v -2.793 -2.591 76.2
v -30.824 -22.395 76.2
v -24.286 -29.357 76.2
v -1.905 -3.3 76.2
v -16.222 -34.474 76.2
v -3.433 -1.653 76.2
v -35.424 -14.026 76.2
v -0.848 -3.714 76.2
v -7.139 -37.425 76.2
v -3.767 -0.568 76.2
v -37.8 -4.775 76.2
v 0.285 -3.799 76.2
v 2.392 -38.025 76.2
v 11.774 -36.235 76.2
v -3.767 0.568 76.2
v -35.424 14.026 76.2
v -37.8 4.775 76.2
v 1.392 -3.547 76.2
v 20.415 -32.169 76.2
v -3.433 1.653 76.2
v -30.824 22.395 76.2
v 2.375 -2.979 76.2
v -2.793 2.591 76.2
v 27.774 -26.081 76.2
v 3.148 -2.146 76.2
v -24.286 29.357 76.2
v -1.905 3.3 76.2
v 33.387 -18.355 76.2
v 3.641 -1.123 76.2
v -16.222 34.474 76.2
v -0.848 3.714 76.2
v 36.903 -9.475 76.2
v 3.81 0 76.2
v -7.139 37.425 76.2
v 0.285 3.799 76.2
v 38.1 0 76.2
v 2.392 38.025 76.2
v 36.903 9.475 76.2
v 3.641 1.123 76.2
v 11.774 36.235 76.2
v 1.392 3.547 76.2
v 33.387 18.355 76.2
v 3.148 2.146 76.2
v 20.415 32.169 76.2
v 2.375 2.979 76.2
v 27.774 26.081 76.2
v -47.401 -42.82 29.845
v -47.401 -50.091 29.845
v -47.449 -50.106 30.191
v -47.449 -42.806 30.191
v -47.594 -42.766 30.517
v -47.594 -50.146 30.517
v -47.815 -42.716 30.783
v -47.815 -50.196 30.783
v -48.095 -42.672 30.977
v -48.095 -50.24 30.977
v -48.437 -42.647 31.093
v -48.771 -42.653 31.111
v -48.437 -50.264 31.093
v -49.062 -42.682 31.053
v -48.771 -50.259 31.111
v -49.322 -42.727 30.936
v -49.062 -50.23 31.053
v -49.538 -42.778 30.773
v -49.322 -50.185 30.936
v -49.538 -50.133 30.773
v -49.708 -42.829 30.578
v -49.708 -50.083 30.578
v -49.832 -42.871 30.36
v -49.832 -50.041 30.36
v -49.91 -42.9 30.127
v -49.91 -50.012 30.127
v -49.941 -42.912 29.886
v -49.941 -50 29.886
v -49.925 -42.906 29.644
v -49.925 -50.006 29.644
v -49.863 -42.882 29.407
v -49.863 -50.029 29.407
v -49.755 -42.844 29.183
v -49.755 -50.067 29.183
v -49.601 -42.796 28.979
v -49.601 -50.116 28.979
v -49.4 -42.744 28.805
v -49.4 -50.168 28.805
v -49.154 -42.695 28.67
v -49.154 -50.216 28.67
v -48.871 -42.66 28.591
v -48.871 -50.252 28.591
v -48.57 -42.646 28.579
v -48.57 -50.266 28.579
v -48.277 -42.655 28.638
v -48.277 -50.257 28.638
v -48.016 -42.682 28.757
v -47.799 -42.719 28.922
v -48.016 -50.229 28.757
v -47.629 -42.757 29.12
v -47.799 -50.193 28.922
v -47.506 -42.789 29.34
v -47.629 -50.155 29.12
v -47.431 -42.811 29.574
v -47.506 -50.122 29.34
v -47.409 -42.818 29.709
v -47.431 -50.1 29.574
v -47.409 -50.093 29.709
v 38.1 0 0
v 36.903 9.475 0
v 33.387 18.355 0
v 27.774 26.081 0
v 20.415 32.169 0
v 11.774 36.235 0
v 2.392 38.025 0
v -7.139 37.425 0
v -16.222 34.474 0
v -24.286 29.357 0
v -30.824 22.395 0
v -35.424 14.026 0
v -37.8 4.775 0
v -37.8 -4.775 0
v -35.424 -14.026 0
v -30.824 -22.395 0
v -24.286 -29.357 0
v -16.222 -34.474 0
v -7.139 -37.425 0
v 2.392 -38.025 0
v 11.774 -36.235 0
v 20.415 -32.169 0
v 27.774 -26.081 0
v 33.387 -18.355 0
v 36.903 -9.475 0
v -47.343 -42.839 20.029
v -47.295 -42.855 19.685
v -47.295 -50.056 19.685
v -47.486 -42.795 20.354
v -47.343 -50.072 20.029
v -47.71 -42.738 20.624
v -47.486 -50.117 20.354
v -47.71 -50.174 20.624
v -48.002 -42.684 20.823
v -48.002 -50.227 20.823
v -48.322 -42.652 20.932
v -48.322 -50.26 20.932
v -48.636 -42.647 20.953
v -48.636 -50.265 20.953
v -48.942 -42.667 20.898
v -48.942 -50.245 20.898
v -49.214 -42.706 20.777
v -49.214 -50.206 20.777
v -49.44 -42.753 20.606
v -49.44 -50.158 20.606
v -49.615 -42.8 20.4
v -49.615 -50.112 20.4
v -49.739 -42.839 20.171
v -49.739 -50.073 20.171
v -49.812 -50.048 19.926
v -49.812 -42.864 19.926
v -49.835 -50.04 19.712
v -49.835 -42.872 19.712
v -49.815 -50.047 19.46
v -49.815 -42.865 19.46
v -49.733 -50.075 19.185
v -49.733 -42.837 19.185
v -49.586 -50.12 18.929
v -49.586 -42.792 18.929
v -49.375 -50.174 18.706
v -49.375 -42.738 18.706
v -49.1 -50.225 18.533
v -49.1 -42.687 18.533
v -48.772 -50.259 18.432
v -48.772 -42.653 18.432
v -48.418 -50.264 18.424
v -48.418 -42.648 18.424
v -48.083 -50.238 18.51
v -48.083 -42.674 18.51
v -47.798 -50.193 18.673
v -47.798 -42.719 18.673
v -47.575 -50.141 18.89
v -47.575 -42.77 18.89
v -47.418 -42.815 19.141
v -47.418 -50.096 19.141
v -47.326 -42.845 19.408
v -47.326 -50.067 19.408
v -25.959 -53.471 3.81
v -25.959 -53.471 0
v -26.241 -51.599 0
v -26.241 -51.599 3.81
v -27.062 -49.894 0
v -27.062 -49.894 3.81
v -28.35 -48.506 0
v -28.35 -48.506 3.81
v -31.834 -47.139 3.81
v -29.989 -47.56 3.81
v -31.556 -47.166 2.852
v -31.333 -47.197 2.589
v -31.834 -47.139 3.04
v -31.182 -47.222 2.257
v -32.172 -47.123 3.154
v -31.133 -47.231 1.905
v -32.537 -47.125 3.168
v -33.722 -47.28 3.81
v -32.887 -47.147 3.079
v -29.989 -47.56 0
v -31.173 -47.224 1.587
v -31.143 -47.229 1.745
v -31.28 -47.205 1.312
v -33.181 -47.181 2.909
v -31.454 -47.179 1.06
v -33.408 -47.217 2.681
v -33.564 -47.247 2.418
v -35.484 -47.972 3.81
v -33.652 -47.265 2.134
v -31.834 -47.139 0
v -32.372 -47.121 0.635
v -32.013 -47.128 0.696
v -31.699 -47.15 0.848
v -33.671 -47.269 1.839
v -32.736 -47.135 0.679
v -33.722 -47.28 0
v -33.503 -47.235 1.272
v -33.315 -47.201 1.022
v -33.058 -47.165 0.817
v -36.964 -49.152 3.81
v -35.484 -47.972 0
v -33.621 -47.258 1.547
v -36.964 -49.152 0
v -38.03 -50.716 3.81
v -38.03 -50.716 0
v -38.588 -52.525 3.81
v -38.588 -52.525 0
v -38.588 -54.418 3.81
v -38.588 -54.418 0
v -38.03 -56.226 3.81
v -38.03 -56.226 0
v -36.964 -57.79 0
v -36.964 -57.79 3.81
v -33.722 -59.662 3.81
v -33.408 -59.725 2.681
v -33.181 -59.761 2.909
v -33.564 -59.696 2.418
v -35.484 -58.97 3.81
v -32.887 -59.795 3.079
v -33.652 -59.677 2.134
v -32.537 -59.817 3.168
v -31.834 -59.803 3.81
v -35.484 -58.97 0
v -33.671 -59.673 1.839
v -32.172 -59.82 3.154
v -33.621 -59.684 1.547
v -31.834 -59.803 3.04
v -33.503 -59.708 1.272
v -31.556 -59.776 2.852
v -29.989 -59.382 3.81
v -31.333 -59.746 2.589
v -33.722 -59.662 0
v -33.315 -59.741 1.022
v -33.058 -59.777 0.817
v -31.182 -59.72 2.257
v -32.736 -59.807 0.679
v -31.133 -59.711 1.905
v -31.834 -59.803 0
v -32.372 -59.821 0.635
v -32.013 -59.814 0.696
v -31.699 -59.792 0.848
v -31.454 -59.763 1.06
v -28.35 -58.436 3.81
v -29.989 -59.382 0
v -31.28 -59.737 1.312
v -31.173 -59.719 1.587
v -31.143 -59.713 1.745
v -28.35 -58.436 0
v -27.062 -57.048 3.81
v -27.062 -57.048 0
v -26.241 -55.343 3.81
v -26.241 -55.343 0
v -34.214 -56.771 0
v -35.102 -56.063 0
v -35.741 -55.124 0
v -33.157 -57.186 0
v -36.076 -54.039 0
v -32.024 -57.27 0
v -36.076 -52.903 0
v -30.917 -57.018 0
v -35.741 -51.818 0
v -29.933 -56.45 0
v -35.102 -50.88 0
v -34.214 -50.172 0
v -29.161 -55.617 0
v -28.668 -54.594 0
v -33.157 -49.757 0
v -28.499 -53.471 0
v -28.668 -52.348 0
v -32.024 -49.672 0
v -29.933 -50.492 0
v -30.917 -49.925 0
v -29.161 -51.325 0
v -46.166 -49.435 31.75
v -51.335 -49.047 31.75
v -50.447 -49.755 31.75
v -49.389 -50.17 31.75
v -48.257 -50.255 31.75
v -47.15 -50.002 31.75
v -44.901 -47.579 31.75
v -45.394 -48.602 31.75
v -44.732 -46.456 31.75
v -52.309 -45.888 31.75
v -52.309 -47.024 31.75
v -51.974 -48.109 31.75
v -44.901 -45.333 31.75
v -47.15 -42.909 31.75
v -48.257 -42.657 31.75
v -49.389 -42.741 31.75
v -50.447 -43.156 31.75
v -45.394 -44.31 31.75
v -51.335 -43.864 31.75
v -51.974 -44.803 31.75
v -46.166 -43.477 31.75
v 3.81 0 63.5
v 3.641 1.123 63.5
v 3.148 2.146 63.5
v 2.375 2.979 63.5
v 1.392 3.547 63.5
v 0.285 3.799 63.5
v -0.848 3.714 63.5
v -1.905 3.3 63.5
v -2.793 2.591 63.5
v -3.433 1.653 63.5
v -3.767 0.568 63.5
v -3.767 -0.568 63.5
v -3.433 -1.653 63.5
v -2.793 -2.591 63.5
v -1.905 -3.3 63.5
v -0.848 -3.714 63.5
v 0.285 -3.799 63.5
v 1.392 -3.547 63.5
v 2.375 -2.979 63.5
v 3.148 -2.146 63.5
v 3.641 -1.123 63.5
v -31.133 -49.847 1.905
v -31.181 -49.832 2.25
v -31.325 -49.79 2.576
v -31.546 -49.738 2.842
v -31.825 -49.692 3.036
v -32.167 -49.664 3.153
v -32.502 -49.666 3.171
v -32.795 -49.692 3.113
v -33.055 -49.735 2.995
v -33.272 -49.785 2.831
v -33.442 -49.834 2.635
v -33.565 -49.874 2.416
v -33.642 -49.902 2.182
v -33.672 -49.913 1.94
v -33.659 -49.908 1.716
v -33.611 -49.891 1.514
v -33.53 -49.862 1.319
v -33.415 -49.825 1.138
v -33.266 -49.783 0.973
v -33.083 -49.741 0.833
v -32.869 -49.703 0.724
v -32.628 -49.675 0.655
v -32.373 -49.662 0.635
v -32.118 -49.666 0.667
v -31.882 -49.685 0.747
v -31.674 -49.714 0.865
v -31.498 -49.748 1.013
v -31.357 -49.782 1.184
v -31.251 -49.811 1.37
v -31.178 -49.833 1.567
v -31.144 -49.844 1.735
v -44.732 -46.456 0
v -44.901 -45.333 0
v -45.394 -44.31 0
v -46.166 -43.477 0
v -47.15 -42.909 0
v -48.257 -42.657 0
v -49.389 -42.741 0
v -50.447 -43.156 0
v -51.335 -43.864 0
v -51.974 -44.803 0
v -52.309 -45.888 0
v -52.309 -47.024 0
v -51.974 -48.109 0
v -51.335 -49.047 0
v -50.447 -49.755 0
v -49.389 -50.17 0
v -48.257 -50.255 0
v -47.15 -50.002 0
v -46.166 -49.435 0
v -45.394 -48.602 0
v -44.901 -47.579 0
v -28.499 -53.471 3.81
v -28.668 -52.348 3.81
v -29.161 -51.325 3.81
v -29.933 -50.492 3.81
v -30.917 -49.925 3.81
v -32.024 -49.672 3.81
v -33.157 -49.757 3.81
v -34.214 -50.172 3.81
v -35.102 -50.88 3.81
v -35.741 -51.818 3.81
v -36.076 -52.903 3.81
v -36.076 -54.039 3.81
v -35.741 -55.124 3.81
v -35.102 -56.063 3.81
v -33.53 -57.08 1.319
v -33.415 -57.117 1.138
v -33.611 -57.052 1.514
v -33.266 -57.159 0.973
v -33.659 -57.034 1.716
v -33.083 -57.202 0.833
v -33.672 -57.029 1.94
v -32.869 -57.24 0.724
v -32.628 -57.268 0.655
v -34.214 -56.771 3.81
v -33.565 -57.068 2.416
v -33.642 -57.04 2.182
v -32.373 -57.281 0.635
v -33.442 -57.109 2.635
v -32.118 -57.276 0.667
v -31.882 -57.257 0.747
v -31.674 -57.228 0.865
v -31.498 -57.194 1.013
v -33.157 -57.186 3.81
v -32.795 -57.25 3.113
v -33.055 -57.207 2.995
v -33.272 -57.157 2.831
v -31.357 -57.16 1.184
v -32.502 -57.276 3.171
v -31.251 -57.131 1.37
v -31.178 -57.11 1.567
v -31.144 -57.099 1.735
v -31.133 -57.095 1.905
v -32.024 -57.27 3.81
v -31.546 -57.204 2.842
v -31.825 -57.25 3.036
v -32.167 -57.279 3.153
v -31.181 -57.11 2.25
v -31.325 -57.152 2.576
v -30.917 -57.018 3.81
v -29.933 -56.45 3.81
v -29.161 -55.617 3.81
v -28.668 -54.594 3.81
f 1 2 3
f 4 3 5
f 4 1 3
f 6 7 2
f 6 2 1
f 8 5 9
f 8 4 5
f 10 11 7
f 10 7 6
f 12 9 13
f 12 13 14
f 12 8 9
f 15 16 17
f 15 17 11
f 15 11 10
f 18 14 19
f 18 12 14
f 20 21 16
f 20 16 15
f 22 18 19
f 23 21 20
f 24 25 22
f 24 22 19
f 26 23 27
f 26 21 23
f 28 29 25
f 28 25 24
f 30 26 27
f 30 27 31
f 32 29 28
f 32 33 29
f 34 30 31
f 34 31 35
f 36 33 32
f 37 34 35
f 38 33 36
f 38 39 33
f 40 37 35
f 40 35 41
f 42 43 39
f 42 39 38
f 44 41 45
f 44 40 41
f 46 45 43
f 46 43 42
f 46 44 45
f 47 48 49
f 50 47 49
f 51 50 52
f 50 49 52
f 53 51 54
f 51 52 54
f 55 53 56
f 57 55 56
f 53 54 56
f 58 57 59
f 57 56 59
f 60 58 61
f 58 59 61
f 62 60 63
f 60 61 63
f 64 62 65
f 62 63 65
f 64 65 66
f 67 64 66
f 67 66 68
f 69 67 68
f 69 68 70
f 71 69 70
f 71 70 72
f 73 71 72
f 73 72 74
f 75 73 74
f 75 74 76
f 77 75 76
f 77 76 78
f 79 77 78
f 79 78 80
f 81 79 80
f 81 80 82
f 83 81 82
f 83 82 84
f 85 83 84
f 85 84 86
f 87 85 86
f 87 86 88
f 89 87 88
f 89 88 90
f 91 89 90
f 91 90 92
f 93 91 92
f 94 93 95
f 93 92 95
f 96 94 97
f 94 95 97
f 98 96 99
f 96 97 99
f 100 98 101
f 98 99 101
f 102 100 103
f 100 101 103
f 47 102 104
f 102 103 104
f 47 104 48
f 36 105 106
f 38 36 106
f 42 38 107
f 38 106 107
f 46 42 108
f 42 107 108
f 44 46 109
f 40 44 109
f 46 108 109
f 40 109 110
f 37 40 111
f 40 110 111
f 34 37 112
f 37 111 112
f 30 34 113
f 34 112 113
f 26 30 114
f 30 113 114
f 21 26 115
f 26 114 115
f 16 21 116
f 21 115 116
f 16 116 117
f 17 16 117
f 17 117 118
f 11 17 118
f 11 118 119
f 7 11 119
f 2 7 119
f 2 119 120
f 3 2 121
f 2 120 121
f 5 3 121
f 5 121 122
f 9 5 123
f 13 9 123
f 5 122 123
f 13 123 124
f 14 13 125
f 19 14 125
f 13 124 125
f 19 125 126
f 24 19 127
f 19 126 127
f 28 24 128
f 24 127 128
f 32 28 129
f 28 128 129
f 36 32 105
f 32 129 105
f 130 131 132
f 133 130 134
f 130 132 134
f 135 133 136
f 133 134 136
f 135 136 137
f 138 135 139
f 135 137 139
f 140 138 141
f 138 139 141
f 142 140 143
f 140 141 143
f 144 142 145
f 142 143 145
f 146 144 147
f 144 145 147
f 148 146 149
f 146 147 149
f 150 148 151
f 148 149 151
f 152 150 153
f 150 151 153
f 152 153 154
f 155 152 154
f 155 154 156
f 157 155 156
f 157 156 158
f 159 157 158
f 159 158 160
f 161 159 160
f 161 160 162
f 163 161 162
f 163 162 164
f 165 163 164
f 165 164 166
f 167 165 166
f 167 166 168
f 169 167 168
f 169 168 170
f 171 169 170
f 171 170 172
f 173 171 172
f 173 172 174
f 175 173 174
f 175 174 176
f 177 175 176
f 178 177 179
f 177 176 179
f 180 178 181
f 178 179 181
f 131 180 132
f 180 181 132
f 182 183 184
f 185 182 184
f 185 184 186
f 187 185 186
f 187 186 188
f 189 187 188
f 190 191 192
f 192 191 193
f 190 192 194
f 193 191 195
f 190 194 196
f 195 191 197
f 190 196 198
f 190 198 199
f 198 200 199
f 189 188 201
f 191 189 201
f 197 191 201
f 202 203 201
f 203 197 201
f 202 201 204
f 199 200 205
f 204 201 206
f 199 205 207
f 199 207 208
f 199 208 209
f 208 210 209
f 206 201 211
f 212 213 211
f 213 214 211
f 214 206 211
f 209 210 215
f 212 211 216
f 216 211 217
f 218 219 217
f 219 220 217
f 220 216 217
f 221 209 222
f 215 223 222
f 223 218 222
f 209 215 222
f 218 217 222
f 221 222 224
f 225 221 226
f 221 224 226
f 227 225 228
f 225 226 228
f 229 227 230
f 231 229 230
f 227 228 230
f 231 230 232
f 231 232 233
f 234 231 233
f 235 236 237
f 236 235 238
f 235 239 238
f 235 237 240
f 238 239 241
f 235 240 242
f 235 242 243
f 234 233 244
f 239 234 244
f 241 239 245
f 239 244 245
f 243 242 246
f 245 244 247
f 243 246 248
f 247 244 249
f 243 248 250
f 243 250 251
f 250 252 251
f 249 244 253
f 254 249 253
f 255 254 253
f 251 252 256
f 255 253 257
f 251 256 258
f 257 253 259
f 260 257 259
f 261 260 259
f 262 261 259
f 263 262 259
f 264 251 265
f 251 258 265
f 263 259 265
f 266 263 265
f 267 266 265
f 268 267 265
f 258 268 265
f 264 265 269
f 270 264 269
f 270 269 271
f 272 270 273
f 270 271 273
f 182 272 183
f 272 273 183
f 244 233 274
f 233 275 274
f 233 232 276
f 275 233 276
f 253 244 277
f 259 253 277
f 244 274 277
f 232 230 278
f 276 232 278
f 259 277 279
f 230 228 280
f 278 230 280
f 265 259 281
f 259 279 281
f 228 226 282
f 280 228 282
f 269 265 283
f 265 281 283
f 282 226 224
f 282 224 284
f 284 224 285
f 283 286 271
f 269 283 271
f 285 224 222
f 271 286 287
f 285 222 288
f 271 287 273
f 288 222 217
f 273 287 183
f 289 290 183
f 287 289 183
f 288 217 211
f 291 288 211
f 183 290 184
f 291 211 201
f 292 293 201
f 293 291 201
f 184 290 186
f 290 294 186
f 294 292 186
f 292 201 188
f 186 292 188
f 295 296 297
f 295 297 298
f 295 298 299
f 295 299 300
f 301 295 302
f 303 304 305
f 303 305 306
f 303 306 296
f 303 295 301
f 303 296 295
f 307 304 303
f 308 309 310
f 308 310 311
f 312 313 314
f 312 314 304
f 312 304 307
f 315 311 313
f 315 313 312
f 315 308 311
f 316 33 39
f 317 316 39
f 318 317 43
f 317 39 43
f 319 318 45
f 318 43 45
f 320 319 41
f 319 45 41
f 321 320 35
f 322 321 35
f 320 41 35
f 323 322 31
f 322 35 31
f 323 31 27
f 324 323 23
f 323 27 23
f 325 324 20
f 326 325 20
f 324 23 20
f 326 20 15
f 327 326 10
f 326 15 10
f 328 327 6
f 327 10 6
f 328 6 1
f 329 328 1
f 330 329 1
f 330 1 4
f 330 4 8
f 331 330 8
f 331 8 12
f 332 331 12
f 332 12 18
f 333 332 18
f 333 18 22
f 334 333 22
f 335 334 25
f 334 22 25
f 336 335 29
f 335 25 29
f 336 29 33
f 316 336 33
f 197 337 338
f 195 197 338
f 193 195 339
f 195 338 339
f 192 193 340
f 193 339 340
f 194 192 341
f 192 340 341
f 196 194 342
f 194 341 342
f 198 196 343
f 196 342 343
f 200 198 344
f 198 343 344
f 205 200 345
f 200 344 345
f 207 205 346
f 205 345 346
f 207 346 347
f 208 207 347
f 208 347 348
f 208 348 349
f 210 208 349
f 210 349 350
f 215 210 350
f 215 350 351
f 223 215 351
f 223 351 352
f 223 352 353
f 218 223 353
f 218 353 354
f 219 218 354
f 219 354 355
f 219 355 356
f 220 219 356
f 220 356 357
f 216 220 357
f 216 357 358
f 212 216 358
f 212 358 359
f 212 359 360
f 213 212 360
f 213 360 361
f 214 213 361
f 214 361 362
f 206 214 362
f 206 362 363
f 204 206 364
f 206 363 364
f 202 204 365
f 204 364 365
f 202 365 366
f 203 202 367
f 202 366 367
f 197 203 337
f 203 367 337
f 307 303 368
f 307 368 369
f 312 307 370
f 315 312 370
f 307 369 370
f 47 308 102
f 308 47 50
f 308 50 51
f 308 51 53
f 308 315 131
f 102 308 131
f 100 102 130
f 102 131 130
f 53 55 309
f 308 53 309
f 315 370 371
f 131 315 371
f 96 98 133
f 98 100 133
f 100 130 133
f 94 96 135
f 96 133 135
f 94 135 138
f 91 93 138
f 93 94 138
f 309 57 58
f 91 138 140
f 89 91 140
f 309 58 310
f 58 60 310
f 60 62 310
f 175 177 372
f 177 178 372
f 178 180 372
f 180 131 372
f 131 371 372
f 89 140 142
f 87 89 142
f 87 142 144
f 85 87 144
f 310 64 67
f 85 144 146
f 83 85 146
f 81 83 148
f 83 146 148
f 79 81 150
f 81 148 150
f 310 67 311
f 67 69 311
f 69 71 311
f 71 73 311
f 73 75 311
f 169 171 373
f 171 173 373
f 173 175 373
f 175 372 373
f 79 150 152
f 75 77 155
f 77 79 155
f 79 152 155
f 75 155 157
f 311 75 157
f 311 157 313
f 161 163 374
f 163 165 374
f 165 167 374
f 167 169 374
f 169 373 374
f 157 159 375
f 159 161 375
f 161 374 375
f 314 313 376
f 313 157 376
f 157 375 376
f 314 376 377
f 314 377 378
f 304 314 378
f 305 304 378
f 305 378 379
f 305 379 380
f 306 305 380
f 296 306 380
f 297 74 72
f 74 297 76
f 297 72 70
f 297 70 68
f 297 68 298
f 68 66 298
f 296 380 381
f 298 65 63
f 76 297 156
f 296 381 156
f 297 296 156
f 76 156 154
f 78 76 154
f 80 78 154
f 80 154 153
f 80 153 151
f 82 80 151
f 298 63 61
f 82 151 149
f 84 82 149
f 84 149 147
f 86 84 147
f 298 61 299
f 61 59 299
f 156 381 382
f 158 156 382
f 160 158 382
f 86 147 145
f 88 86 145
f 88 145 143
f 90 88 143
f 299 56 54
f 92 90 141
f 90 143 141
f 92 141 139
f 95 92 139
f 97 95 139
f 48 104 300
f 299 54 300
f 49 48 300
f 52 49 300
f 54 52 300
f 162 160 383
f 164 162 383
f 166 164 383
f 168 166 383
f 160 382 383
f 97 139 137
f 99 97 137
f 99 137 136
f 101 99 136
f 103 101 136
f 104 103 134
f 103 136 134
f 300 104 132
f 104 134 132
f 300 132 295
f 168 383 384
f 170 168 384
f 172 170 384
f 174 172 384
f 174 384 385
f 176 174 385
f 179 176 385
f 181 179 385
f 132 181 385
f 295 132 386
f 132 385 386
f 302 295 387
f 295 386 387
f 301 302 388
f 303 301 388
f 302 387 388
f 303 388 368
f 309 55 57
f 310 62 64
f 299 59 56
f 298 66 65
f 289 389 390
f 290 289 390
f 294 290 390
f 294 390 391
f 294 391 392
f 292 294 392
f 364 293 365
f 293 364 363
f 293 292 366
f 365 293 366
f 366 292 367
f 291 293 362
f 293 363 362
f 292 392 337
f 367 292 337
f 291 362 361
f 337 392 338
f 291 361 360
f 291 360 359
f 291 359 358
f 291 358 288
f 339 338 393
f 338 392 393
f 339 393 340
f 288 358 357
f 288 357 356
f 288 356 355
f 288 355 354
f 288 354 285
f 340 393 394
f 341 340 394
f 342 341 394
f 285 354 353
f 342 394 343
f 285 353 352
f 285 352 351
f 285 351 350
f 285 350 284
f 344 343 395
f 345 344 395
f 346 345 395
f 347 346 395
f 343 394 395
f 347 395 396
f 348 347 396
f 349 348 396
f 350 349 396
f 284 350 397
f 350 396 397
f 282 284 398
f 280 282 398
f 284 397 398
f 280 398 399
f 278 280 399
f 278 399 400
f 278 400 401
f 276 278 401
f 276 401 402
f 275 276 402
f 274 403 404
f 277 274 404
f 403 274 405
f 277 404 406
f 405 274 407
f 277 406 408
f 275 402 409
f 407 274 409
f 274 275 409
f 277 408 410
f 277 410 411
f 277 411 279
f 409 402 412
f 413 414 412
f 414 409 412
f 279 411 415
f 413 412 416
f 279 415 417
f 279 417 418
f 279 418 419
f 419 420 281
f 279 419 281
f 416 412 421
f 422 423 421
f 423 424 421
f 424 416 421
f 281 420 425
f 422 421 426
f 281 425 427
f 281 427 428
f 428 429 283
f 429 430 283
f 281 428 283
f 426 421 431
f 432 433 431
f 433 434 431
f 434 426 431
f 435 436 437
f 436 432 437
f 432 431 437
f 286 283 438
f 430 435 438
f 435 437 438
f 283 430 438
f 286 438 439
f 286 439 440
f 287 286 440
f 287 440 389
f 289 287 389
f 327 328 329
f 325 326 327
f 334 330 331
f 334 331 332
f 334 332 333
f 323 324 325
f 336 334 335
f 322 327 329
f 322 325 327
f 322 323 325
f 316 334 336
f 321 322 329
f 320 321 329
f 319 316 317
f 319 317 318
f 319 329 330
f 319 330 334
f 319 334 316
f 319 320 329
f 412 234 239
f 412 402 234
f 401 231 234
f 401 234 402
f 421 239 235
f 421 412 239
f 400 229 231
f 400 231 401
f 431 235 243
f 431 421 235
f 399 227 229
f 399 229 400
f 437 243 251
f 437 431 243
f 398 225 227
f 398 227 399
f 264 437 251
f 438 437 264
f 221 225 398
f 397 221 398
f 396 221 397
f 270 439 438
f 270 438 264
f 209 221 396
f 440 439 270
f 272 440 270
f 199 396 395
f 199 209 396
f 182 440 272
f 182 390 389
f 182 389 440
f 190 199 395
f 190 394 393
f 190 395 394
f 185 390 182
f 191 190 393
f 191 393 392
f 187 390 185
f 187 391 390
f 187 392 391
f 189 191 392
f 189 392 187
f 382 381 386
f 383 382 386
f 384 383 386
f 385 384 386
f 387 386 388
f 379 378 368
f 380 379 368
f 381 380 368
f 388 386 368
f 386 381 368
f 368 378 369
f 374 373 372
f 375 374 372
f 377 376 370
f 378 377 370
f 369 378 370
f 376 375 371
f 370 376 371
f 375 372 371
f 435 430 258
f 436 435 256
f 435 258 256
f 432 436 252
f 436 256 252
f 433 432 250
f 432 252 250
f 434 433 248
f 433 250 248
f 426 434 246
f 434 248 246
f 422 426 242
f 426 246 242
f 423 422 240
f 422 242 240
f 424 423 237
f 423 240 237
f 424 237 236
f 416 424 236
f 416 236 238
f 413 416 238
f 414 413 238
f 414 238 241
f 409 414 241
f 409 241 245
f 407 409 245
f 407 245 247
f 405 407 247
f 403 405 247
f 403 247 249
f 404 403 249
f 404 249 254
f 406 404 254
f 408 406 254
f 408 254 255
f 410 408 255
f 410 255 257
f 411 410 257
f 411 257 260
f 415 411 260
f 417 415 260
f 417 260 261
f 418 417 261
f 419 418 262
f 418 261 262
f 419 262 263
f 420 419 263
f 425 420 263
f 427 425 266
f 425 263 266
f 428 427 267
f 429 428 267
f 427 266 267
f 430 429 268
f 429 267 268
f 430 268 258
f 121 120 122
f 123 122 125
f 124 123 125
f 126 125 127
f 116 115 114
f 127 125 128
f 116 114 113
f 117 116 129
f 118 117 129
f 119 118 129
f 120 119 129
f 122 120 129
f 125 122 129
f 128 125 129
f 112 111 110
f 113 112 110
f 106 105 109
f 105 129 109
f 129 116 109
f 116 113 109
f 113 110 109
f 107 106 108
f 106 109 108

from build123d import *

# Parameters (mm, degrees)
F0_R      = 38.1
F1_DEPTH  = 76.2
F2_R      = 3.81
F3_DEPTH  = 12.7
F4_R      = 3.81
F5_DEPTH  = 31.75
F6_R      = 6.35
F7_DEPTH  = 3.81
F8_R      = 3.81
F9_DEPTH  = 5.08
F11_R     = 1.27
F12_DEPTH = 38.1
F13_R     = 1.27
F15_DEPTH = 38.1
F14_R     = 1.27
F16_DEPTH = 38.1


with BuildPart() as f1:
    # F0 (on Top) → F1 (new body)
    with BuildSketch(Plane.XY):
        Circle(F0_R)
    extrude(amount=F1_DEPTH)

    # F2 (on face) → F3 (cut)
    with BuildSketch(Plane.XY.offset(76.2)):
        Circle(F2_R)
    extrude(amount=-F3_DEPTH, mode=Mode.SUBTRACT)


with BuildPart() as f5:
    # F4 (on Top) → F5 (new body)
    with BuildSketch(Plane.XY):
        with Locations((-48.54162, -46.455853)):
            Circle(F4_R)
    extrude(amount=F5_DEPTH)

    # F13 (on offset) → F15 (cut)
    with BuildSketch(Plane.XZ.offset(76.2)):
        with Locations((-48.671335, 29.845)):
            Circle(F13_R)
    extrude(amount=-F15_DEPTH, mode=Mode.SUBTRACT)

    # F14 (on offset) → F16 (cut)
    with BuildSketch(Plane.XZ.offset(76.2)):
        with Locations((-48.565377, 19.685)):
            Circle(F14_R)
    extrude(amount=-F16_DEPTH, mode=Mode.SUBTRACT)


with BuildPart() as f7:
    # F6 (on Top) → F7 (new body)
    with BuildSketch(Plane.XY):
        with Locations((-32.308768, -53.471129)):
            Circle(F6_R)
    extrude(amount=F7_DEPTH)

    # F8 (on face) → F9 (cut)
    with BuildSketch(Plane.XY.offset(3.81)):
        with Locations((-32.308768, -53.471129)):
            Circle(F8_R)
    extrude(amount=-F9_DEPTH, mode=Mode.SUBTRACT)

    # F11 (on offset) → F12 (cut)
    with BuildSketch(Plane.XZ.offset(76.2)):
        with Locations((-32.402672, 1.905)):
            Circle(F11_R)
    extrude(amount=-F12_DEPTH, mode=Mode.SUBTRACT)


solid = Compound([f1.part, f5.part, f7.part])
